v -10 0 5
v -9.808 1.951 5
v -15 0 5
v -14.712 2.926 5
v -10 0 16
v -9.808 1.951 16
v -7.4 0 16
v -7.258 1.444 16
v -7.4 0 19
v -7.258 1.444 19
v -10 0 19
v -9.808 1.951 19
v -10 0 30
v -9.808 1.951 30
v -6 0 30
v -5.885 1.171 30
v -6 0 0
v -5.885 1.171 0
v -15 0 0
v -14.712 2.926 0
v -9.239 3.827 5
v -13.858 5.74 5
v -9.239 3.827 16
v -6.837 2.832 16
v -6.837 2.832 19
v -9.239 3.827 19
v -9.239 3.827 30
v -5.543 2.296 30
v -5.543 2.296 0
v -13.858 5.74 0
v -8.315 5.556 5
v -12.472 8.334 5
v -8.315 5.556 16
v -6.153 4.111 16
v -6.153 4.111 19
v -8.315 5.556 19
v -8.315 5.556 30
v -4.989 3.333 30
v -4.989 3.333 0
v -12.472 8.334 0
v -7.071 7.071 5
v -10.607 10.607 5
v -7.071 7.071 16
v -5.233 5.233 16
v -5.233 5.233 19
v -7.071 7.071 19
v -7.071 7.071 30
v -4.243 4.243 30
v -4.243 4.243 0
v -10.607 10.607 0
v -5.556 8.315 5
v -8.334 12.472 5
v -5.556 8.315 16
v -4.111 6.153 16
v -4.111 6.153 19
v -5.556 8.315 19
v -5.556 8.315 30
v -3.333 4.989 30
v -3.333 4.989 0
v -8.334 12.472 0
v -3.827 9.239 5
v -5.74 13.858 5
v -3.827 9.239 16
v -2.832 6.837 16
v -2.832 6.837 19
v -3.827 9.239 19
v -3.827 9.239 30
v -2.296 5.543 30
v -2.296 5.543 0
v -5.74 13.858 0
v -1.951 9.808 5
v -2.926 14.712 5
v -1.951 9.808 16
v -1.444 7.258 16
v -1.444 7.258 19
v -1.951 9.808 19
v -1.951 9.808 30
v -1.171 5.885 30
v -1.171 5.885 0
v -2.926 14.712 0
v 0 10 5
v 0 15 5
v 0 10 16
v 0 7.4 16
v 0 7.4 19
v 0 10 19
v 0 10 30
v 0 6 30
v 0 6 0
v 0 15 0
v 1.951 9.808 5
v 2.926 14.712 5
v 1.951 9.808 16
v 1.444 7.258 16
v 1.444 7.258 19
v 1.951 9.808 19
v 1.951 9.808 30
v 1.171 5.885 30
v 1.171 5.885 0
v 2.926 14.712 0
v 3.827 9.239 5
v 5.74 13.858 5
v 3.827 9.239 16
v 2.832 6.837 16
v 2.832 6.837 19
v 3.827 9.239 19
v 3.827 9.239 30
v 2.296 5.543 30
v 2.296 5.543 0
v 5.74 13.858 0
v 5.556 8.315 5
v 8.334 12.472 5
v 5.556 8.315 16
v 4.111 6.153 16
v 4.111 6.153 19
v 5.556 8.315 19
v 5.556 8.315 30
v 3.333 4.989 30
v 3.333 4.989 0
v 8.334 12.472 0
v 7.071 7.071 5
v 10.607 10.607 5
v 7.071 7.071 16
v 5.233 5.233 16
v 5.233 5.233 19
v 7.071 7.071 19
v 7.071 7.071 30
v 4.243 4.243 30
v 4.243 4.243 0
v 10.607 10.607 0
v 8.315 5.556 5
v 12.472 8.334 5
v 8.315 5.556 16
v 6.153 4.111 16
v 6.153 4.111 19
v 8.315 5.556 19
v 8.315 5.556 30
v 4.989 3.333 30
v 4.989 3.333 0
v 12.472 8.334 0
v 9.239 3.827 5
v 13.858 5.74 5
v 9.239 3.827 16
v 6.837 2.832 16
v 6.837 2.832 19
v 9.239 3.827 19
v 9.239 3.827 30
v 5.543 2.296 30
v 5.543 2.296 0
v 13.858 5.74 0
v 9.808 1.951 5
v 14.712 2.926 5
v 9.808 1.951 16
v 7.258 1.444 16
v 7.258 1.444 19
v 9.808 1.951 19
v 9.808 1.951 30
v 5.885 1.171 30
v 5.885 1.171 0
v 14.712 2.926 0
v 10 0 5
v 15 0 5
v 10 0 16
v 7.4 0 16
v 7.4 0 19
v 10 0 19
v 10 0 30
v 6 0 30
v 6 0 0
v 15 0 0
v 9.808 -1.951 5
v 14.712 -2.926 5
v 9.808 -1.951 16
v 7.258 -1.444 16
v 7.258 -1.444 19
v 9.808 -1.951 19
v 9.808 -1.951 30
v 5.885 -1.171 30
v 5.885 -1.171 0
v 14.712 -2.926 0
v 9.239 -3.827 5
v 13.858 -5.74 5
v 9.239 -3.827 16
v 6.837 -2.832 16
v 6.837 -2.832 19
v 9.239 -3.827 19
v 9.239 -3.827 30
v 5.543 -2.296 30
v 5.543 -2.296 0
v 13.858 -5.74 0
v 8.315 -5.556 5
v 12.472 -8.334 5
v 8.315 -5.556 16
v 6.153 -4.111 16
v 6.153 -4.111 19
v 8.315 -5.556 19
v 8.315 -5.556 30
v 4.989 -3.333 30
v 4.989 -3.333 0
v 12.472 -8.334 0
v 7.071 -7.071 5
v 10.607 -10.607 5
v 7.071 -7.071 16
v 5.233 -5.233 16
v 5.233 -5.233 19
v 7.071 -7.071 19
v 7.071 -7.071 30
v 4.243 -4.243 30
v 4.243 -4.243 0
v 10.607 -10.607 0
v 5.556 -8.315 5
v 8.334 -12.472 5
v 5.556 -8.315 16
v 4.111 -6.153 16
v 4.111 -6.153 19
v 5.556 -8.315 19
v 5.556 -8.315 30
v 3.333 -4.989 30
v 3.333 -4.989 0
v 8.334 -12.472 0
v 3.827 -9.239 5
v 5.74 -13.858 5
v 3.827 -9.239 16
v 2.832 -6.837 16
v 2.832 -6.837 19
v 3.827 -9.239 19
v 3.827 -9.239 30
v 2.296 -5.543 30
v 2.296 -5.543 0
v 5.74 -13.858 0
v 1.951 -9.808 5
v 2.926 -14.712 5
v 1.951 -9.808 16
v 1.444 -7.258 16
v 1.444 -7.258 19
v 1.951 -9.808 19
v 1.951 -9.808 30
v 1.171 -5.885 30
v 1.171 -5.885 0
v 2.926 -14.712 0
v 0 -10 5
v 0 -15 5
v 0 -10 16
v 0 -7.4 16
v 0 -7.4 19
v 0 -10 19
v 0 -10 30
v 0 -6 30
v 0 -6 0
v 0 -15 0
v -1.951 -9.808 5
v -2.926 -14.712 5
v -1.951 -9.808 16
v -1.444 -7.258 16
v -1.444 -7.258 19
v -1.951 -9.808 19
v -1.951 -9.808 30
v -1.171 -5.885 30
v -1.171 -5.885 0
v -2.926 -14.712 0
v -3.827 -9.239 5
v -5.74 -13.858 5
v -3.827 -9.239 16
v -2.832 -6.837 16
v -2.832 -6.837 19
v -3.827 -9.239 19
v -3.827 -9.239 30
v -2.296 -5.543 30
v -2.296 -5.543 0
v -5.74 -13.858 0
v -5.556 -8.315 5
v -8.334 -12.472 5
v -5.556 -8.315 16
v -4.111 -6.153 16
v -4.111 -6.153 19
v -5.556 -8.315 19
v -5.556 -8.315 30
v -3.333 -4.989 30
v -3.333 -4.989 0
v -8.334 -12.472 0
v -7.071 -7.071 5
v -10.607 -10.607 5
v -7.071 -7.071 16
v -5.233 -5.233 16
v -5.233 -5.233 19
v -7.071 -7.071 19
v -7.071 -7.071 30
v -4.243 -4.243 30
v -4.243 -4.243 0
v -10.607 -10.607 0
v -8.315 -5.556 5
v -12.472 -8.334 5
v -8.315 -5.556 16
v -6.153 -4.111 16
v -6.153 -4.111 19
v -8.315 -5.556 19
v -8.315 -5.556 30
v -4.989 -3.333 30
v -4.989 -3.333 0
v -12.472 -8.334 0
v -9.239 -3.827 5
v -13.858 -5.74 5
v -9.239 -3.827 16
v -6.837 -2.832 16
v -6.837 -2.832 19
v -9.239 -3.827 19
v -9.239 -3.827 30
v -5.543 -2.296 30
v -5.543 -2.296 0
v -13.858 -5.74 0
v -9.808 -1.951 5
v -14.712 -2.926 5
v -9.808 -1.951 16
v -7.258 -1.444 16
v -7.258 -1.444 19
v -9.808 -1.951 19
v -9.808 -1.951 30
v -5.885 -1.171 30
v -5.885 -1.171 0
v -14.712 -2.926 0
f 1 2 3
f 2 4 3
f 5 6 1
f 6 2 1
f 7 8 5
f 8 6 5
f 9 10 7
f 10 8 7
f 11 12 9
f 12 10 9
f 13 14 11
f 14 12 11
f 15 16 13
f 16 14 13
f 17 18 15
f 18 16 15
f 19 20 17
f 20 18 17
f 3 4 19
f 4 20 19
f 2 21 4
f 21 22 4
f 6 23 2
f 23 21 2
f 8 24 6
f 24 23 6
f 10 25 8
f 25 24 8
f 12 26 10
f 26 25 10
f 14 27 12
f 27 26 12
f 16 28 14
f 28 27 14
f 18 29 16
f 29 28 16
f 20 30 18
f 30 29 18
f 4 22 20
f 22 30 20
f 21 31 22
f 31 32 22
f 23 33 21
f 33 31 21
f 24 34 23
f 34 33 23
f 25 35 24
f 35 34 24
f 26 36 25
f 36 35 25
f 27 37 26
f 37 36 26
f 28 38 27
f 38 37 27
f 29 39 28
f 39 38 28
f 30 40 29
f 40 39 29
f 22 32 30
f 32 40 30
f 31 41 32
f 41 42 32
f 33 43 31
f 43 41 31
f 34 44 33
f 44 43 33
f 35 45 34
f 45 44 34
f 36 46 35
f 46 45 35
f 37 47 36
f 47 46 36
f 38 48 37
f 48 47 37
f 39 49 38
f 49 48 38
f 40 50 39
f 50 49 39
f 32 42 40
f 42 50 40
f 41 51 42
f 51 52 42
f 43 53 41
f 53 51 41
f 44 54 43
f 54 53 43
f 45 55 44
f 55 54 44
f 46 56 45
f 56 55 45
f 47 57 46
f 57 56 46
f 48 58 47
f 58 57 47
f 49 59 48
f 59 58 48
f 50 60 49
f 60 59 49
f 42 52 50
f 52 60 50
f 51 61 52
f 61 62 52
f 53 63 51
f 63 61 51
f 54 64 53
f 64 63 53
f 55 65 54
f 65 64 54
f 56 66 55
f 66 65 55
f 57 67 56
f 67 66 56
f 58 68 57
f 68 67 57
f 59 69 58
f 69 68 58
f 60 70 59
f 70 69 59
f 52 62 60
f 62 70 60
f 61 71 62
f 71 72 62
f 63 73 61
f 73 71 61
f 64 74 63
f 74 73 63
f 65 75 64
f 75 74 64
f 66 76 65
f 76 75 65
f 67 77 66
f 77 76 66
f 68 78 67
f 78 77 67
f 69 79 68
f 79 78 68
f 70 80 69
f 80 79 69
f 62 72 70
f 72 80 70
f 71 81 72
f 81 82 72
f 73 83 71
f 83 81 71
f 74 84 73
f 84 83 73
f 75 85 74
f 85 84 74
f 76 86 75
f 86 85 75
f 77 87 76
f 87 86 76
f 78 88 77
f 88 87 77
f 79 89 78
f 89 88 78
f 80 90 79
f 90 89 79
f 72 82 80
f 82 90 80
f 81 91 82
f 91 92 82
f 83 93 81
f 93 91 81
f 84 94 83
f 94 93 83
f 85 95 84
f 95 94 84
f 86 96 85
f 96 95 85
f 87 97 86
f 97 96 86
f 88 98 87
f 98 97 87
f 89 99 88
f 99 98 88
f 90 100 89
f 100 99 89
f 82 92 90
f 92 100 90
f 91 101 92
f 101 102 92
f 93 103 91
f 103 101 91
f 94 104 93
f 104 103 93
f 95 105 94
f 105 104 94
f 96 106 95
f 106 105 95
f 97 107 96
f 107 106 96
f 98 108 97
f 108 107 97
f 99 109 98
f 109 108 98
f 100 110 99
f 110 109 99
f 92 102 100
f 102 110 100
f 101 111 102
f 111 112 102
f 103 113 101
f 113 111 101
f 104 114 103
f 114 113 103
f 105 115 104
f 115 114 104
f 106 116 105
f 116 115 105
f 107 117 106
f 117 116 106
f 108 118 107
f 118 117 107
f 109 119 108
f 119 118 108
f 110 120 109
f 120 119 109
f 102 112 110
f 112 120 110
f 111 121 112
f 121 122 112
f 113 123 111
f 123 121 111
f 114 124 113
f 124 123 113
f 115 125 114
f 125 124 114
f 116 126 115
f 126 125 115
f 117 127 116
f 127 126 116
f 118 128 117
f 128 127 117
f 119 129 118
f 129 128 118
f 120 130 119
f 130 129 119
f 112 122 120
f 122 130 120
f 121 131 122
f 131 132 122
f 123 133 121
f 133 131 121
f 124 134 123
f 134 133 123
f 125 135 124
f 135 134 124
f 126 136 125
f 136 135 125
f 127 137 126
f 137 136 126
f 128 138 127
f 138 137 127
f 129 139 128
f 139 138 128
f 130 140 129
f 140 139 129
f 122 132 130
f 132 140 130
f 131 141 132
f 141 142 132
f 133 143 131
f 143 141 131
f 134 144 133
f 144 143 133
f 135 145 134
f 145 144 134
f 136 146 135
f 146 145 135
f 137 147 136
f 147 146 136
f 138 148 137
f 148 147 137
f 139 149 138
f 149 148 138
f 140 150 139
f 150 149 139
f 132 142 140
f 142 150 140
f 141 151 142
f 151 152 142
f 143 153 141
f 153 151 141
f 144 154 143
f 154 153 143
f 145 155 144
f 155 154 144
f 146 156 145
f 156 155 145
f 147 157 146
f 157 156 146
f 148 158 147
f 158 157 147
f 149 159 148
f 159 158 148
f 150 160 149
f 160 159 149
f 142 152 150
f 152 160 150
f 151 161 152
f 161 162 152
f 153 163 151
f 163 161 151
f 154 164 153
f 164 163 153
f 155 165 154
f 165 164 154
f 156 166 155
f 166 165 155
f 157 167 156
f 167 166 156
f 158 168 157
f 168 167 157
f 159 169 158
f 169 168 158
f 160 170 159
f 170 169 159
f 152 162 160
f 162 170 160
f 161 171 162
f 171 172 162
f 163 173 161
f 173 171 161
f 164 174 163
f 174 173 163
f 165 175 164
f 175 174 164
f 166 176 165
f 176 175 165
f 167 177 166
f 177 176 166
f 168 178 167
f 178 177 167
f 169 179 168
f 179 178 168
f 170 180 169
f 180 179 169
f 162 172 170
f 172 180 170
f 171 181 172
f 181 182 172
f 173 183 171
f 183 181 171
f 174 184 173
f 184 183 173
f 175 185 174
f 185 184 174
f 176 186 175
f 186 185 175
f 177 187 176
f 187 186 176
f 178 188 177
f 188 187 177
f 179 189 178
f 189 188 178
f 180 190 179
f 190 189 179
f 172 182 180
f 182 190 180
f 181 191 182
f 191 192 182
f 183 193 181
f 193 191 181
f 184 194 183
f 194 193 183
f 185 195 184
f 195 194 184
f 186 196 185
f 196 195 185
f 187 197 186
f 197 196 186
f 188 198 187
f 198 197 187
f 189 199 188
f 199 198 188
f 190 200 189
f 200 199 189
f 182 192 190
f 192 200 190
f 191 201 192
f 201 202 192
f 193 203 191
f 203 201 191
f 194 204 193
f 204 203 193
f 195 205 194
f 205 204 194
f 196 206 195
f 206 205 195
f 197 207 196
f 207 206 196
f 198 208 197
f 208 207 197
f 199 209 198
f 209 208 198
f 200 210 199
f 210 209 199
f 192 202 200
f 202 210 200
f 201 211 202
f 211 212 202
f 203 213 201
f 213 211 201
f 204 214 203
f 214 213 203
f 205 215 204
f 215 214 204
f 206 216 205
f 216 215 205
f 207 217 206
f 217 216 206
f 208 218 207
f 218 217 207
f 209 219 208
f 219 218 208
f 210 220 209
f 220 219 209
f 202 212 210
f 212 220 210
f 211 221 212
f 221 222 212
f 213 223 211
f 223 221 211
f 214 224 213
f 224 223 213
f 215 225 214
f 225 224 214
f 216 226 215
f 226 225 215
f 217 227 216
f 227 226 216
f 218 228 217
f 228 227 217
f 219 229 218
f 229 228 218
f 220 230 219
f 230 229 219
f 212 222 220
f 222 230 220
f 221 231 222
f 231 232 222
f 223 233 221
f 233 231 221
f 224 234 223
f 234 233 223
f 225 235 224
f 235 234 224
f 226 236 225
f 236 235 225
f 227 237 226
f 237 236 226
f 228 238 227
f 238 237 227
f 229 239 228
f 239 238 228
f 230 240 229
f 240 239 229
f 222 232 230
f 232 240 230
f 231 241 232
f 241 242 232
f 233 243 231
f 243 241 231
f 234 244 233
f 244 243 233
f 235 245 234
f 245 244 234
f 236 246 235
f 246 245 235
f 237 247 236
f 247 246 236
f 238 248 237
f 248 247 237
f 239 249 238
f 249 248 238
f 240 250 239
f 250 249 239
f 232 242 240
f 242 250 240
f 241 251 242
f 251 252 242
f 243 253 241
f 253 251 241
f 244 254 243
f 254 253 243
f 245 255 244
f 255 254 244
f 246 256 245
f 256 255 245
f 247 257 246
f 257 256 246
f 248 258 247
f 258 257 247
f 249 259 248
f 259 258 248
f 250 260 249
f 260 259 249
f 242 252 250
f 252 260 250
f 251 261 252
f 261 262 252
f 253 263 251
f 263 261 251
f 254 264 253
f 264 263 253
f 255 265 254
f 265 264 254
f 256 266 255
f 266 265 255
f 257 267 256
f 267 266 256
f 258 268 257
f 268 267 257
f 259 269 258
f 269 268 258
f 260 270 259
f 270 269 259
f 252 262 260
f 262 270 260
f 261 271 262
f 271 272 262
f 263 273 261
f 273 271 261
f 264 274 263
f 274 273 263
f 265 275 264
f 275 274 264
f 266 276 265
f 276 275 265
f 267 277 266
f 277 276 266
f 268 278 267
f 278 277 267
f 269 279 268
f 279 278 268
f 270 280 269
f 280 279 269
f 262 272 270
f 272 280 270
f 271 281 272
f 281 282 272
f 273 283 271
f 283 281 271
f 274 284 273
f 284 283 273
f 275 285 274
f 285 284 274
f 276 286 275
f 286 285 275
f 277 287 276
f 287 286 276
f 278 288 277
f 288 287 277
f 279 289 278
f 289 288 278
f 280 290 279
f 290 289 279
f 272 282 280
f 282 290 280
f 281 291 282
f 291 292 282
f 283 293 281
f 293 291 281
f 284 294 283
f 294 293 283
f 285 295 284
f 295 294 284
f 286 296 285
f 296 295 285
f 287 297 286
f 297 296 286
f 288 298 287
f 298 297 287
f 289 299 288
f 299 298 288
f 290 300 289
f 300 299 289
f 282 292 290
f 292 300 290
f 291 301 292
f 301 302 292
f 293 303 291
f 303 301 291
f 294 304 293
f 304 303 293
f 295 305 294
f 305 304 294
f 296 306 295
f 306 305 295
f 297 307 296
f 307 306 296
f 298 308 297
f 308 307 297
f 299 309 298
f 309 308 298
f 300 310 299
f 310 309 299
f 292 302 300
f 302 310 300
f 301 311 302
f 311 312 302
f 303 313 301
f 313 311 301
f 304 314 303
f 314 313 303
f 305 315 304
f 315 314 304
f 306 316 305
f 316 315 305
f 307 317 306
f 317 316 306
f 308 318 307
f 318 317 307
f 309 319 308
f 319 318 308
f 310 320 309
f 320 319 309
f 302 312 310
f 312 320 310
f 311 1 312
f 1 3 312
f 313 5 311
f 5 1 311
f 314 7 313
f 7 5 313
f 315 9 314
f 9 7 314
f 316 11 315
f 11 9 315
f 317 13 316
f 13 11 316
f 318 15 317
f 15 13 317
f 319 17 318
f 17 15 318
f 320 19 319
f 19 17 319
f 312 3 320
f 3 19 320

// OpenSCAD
$fn = 32;

// ----------------------------------------------------------------------
// Grooved revolve: flanged, bore R6
// ----------------------------------------------------------------------

// --- parameters (mm) ---
bore_r = 6;               // bore radius
outer_r = 10;             // outer radius of the body
total_h = 30;             // overall height, Z
wall = 4;                 // radial wall thickness
groove_w = 3;             // groove width
groove_d = 2.6;           // groove depth
grooves = 1;              // number of outer grooves
flange_r = 15;            // flange radius
flange_h = 5;             // flange height

bbox_x = 2 * flange_r;  // full diameter
bore_d = 2 * bore_r;  // bore diameter
body_d = 2 * outer_r;  // body diameter
flange_d = 2 * flange_r;  // flange diameter
revolve_angle = 360;  // full turn around the Z axis

profile = [[6, 0], [10, 0], [15, 0], [15, 5], [10, 5], [10, 16], [7.4, 16], [7.4, 19], [10, 19], [10, 30], [6, 30]];  // primary outline, 11 points, counter clockwise

// --- the one profile operation ---
rotate_extrude(angle = revolve_angle) polygon(points = profile);
